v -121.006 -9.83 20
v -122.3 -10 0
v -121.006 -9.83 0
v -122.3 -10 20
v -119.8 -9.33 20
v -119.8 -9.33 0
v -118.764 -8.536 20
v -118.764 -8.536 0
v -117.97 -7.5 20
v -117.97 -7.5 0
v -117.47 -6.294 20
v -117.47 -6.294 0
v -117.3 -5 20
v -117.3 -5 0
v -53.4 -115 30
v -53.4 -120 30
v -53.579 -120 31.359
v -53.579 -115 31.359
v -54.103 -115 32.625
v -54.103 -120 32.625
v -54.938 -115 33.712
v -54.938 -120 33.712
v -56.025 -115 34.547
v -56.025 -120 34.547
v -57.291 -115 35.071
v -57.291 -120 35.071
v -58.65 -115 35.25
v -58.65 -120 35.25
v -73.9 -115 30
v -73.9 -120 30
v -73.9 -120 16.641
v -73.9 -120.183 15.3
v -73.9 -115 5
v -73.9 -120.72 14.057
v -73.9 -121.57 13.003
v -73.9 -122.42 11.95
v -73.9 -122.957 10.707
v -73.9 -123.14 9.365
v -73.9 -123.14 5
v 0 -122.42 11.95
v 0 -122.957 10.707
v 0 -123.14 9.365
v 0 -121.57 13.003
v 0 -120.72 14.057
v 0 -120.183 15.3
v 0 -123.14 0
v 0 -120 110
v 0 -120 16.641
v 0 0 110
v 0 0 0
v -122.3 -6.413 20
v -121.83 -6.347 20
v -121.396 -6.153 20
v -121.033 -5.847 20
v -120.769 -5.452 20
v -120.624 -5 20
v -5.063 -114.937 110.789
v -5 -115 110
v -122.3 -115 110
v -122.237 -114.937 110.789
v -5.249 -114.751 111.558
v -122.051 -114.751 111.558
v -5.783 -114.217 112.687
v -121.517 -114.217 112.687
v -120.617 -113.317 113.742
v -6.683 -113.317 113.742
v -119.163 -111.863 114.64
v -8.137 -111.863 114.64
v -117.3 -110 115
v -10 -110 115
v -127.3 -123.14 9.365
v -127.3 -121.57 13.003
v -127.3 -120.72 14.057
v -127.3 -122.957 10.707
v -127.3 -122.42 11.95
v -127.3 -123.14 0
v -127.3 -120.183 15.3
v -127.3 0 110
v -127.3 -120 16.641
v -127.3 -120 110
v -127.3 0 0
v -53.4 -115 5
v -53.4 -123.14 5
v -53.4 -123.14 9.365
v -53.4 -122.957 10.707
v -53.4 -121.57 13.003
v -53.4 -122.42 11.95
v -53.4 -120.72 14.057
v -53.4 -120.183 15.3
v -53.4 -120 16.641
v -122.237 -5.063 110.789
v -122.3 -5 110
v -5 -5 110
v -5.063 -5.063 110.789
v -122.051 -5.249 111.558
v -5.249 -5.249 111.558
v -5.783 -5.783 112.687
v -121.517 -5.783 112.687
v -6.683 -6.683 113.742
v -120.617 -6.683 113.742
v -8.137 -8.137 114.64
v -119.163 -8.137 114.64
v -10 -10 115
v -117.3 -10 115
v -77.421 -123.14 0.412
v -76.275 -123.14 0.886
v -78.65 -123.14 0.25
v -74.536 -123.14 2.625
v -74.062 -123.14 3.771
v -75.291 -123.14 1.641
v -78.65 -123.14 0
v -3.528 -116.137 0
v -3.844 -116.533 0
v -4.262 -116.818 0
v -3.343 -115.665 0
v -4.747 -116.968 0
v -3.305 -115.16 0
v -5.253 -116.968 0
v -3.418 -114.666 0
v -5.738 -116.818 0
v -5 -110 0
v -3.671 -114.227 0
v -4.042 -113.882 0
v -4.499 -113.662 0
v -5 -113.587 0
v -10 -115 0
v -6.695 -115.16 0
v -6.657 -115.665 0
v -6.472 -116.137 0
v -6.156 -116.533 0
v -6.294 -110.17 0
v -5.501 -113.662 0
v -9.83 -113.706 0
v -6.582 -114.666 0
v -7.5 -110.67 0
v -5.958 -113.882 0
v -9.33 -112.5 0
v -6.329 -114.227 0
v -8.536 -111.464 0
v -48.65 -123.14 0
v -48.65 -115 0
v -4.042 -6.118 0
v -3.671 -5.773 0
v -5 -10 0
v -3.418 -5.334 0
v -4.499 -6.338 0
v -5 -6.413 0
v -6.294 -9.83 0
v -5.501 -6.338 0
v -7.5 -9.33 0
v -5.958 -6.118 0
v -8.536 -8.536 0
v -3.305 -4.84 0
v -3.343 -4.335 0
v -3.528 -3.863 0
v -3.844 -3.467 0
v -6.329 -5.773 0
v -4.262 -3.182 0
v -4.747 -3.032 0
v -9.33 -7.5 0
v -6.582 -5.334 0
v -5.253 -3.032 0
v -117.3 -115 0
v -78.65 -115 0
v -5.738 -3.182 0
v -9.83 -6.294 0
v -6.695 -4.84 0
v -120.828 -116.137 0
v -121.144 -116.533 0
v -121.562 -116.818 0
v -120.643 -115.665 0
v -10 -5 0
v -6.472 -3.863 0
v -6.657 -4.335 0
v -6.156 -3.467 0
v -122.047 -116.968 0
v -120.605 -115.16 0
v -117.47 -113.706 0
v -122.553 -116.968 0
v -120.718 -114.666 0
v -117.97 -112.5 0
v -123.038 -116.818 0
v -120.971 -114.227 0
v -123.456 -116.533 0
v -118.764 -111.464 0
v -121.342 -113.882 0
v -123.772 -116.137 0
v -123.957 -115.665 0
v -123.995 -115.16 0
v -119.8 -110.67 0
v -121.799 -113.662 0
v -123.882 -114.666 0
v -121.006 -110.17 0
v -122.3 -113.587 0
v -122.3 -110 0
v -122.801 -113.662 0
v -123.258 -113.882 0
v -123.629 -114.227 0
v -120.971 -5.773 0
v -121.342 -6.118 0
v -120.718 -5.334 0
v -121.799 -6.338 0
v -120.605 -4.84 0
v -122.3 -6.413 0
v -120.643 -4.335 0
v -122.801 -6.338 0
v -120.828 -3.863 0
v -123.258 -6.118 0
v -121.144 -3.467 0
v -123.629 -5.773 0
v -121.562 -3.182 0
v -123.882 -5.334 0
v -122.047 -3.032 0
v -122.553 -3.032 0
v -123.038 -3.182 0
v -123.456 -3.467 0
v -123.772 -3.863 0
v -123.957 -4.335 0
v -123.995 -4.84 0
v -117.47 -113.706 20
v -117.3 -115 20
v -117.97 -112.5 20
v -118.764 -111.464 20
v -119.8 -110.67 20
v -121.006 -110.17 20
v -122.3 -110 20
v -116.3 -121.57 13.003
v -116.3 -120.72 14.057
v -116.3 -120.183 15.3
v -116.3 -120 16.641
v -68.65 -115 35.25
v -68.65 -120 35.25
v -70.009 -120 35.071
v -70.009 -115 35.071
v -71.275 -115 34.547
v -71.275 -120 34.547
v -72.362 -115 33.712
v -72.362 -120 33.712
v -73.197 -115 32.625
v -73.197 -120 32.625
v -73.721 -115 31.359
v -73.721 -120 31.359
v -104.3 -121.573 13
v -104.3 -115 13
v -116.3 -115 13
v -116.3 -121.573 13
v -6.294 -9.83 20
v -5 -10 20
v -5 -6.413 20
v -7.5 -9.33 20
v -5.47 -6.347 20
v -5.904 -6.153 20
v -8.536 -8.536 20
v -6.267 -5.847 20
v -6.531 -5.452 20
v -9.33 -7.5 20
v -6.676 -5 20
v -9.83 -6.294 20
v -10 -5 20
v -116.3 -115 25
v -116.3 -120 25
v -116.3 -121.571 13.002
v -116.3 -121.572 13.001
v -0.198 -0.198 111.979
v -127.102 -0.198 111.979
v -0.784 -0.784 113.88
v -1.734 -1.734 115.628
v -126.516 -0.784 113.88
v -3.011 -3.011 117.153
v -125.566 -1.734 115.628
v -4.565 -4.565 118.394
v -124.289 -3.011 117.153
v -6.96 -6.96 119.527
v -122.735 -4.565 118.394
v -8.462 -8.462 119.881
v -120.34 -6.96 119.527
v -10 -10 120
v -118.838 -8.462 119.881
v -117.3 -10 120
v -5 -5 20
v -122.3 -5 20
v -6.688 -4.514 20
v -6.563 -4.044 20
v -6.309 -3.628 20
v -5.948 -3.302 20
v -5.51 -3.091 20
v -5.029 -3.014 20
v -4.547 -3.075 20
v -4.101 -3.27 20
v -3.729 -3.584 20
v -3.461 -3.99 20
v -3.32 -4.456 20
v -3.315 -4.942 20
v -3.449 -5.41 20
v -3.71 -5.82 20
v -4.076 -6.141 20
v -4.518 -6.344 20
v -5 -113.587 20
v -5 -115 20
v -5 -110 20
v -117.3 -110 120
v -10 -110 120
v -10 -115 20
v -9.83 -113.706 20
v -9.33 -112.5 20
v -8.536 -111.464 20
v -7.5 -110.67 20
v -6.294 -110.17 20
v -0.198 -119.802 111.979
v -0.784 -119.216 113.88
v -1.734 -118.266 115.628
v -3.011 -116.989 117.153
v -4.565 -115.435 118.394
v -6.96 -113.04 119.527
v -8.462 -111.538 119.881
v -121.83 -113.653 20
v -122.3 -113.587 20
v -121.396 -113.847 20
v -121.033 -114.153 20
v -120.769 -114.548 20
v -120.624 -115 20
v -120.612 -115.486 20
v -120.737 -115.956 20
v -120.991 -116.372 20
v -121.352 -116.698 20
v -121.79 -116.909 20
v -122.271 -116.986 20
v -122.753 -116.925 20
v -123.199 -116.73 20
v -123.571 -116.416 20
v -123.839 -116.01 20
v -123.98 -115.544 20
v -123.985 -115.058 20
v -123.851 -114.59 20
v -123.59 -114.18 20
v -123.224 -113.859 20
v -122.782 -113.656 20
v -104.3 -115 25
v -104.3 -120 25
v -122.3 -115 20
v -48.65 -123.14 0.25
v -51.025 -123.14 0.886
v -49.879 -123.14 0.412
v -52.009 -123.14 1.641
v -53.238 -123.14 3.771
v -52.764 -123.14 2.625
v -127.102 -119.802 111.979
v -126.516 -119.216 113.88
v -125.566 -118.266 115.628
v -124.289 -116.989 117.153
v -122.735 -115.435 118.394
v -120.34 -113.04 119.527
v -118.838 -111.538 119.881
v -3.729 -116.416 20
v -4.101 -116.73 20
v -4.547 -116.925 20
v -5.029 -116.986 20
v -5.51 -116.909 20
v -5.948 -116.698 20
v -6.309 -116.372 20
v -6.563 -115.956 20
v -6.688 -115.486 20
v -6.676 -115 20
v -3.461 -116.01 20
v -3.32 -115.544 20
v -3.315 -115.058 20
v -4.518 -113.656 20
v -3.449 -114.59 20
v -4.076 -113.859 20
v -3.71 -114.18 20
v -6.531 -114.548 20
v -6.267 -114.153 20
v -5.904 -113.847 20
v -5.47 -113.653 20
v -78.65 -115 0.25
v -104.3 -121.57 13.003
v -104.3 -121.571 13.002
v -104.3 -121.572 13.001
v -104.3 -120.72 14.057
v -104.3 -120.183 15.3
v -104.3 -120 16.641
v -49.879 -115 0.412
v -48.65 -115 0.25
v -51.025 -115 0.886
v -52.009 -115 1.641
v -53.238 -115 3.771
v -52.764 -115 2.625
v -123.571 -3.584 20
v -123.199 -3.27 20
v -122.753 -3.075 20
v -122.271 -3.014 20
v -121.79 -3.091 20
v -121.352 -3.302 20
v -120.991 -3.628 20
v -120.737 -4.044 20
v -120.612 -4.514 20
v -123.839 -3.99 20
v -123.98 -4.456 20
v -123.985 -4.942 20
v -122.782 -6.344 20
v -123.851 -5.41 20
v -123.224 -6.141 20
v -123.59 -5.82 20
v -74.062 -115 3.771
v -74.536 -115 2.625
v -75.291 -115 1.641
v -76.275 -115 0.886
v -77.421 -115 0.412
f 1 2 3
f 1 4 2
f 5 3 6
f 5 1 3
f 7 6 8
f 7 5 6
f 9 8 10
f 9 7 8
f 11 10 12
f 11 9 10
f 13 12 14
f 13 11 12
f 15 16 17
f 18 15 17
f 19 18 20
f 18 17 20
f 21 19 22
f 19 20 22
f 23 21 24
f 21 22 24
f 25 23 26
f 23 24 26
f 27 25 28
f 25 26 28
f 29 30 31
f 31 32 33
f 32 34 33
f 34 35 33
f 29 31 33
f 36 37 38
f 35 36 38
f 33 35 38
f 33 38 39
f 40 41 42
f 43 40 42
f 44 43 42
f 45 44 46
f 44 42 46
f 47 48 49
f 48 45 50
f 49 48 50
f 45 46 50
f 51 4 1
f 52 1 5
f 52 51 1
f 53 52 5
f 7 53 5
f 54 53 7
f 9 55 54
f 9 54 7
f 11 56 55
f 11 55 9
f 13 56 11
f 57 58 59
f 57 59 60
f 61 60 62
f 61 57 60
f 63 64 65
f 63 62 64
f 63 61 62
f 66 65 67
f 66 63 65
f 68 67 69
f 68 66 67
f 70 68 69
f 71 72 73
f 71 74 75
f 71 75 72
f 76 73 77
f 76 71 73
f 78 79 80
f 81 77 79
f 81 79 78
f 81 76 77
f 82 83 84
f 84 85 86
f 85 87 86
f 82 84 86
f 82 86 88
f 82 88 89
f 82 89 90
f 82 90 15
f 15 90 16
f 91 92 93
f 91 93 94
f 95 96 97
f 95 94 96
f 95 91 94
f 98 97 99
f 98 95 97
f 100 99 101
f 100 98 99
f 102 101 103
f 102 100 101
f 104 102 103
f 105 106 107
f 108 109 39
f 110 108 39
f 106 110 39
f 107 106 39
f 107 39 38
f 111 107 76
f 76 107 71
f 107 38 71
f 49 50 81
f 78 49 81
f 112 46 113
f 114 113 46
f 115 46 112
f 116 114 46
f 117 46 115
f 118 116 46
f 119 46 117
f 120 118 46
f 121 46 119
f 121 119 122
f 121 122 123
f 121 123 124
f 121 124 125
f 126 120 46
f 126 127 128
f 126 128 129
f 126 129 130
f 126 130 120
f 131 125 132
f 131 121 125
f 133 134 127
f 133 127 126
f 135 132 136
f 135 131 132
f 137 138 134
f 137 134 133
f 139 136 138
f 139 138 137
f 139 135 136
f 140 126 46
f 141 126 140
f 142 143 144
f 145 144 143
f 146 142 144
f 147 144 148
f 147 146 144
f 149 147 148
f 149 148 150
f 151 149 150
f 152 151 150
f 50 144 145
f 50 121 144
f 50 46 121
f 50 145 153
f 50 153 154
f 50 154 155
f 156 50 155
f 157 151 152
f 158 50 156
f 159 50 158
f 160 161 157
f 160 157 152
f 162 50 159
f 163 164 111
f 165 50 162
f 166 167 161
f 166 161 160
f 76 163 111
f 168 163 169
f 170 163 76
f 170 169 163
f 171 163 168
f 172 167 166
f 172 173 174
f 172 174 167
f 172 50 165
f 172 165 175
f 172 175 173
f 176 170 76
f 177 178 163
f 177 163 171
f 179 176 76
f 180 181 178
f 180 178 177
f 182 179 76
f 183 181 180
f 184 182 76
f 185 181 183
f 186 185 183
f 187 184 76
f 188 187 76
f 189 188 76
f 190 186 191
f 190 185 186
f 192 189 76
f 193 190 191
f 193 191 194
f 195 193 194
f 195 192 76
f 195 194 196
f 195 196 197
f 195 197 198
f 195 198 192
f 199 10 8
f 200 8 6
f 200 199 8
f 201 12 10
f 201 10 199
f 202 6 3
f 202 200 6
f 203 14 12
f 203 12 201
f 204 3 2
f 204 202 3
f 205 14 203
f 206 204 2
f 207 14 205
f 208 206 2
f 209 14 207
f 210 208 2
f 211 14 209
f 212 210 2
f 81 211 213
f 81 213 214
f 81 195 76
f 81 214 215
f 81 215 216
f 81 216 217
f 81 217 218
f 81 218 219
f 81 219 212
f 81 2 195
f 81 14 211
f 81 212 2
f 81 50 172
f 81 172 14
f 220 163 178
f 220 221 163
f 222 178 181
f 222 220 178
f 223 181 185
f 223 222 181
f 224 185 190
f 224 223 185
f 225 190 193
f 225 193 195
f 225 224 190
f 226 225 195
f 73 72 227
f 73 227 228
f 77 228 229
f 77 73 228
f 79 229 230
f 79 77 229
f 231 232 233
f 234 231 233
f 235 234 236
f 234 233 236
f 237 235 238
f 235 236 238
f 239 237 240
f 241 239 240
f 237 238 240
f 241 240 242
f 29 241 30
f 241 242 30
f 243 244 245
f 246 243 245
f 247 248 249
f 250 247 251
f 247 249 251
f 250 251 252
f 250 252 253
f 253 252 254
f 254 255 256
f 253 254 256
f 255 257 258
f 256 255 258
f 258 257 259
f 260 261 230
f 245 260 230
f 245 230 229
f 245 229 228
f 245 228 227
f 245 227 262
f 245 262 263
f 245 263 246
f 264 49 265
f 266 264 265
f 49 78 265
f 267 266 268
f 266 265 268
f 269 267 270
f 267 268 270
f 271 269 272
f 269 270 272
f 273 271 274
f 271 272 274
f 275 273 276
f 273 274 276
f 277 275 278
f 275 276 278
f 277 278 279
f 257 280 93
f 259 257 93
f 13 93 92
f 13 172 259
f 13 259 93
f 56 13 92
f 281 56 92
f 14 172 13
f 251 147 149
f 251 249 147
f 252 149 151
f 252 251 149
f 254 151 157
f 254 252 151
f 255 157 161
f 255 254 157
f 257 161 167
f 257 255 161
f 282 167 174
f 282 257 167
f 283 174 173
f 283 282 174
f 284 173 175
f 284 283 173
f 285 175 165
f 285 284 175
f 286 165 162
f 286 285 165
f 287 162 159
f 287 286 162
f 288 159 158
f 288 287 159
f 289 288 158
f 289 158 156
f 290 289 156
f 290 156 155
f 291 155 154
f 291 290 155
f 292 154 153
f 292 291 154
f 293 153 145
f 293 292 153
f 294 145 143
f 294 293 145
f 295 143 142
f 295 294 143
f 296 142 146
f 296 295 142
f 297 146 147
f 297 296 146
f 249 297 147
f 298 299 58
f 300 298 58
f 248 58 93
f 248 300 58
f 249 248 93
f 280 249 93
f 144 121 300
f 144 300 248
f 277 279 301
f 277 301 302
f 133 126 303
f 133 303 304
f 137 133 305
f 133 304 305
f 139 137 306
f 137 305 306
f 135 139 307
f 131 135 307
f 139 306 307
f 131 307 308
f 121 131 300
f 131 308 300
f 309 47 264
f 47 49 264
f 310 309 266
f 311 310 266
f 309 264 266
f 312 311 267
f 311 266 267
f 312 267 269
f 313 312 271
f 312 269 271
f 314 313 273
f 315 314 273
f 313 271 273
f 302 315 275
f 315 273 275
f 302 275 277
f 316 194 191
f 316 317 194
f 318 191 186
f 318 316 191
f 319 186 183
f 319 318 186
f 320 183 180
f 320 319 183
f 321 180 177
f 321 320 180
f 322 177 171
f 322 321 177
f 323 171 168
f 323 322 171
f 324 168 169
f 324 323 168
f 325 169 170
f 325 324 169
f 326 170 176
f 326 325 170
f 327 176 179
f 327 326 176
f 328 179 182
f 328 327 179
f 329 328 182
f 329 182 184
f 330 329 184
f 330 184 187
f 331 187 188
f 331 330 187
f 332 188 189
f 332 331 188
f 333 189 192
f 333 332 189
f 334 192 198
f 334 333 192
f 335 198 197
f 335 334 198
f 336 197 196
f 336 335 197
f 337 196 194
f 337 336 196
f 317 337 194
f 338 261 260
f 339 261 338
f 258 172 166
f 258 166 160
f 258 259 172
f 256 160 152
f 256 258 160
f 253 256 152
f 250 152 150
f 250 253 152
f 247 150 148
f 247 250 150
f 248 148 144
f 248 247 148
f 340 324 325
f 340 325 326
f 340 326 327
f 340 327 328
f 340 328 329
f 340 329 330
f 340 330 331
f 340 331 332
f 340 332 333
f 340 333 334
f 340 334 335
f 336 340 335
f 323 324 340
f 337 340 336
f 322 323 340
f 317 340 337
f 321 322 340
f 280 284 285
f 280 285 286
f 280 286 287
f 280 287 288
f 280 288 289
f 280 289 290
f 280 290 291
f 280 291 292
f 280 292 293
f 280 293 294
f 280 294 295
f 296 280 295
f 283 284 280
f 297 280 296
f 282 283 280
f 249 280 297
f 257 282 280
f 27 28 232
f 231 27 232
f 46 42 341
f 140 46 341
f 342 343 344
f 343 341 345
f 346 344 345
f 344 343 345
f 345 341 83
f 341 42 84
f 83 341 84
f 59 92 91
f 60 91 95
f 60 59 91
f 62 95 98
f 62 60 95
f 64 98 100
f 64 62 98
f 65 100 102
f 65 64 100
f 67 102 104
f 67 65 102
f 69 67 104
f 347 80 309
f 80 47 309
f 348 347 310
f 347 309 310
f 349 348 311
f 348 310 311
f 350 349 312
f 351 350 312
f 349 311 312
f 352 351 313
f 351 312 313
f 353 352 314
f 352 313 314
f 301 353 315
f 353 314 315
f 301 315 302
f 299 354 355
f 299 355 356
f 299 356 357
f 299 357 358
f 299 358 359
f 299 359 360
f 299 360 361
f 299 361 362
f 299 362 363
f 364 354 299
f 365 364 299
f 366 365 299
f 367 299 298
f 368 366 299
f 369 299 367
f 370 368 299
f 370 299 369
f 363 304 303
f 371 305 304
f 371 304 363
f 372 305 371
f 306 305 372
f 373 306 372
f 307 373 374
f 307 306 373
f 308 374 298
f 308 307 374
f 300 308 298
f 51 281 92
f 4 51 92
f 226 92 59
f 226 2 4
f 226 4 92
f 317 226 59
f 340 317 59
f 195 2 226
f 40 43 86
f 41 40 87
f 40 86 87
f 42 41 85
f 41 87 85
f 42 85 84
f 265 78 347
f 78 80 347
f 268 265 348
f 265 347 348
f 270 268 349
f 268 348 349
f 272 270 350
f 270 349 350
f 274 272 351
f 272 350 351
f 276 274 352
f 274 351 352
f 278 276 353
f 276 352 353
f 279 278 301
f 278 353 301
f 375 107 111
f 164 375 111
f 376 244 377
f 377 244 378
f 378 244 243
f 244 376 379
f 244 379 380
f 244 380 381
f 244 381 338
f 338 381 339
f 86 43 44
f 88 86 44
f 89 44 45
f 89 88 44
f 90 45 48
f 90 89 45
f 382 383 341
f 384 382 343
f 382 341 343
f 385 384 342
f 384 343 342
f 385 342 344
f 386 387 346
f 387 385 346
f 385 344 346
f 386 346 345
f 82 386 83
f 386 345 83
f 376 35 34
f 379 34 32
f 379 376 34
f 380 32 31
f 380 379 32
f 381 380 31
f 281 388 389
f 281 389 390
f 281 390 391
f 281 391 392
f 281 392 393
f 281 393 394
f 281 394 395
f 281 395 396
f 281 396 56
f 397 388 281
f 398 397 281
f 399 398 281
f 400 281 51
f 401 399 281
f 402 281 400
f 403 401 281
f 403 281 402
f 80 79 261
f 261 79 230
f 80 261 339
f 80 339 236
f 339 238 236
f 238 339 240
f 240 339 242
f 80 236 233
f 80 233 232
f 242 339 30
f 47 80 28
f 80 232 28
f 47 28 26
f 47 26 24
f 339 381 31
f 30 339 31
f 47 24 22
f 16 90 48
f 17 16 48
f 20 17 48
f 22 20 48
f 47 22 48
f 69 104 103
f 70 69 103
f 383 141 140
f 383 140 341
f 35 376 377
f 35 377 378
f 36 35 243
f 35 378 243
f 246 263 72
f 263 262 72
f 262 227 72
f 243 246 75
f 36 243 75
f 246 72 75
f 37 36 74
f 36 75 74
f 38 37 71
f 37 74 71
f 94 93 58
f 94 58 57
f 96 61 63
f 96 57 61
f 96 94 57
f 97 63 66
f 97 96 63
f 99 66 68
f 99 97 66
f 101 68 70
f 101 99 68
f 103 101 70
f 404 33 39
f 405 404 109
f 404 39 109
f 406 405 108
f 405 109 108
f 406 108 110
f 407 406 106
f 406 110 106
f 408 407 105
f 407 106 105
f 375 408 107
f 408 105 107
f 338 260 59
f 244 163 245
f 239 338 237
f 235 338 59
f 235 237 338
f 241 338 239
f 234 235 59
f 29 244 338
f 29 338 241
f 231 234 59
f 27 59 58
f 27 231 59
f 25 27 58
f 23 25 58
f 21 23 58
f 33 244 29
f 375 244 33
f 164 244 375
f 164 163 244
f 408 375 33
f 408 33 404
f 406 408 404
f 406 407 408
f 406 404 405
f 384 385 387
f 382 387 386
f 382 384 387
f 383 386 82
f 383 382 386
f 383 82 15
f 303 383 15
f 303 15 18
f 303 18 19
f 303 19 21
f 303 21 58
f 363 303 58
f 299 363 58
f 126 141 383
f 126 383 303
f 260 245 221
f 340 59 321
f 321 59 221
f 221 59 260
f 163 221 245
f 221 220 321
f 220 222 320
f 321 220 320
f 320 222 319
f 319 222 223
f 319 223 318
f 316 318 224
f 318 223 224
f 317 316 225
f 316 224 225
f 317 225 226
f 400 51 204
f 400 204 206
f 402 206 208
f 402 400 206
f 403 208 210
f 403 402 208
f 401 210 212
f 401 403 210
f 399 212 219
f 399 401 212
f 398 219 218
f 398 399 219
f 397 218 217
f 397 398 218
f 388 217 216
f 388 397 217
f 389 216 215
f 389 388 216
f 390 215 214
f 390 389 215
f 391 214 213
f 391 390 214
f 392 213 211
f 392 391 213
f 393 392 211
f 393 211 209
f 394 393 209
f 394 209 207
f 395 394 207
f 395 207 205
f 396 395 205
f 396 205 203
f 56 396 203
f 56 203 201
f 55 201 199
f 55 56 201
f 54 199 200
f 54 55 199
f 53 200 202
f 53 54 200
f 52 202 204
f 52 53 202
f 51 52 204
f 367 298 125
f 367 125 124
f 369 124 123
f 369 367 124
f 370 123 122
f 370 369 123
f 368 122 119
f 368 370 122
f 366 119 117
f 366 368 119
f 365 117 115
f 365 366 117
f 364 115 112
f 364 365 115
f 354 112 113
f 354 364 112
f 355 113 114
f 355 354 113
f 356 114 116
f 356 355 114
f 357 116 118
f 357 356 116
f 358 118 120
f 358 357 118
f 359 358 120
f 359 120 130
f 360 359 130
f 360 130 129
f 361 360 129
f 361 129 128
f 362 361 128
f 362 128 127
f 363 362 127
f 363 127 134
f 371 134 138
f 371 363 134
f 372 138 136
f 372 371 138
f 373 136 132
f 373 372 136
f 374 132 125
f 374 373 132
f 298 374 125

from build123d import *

# Parameters (mm, degrees)
BOSS_EXTRUDE1_DEPTH     = 120
FILLET1_R               = 10
SHELL3_T                = -5
SKETCH3_R               = 1.7000000000000046
SKETCH3_R_2             = 1.6999999999999973
SKETCH3_R_3             = 1.6999999999999988
SKETCH3_R_4             = 1.7000000000000004
BOSS_EXTRUDE3_DEPTH     = 20
CUT_EXTRUDE1_DEPTH      = 213.14450263912096
CUT_EXTRUDE1_DEPTH_BACK = 20
SKETCH2_R               = 1.6999999999999973
SKETCH2_R_2             = 1.7000000000000024
SKETCH2_R_3             = 1.6999999999999988
SKETCH2_R_4             = 1.7000000000000004
FILLET5_R               = 5
SKETCH4_W               = 11.999999999999972
SKETCH4_H               = 11.999999999999998
CUT_EXTRUDE2_DEPTH      = 11.000000000000004
BOSS_EXTRUDE4_DEPTH     = 3.14
FILLET6_R               = 5
FILLET7_R               = 5
CUT_EXTRUDE3_DEPTH      = 13.140000000000002


# Some blends are built 0.0001 mm under size
with BuildPart() as part:
    # Sketch1 → Boss-Extrude1 (new body)
    with BuildSketch(Plane.XY):
        Polygon((0, 0), (-127.3, 0), (-127.29999999999997, -120.00000000000001), (0, -120.00000000000001), align=None)
    extrude(amount=BOSS_EXTRUDE1_DEPTH)

    # Fillet1
    fillet1_edges = [part.edges().sort_by_distance(p)[0] for p in [
        (-127.29999999999998, -60.00000000000001, 120),
        (-63.649999999999984, -120.00000000000001, 120),
        (0, -60.00000000000001, 120),
        (-63.65, 0, 120),
    ]]
    fillet(fillet1_edges, radius=FILLET1_R)

    # Shell3
    shell3_openings = [part.faces().sort_by_distance(p)[0] for p in [
        (-63.65, -60, 0),
    ]]
    offset(amount=SHELL3_T, openings=shell3_openings)

    # Sketch3 → Boss-Extrude3 (add)
    # profile 1 of 4: a face of its own
    with BuildSketch(Plane(origin=(0, 0, 0), x_dir=(-1, 0, 0), z_dir=(0, 0, -1))):
        Polygon((10.00000000000002, -110.00000000000004), (10.000000000000023, -120.00000000000006), (0, -120.00000000000003), (3.816e-14, -110.00000000000006), align=None)
        with Locations((5, -115.28672427337001)):
            Circle(SKETCH3_R, mode=Mode.SUBTRACT)
    # profile 2 of 4: a face of its own
    with BuildSketch(Plane(origin=(0, 0, 0), x_dir=(-1, 0, 0), z_dir=(0, 0, -1))):
        Polygon((117.30000000000004, -109.99999999999997), (117.30000000000007, -119.99999999999997), (127.29999999999997, -120.00000000000001), (127.30000000000005, -109.99999999999996), align=None)
        with Locations((122.3, -115.28672427337001)):
            Circle(SKETCH3_R_2, mode=Mode.SUBTRACT)
    # profile 3 of 4: a face of its own
    with BuildSketch(Plane(origin=(0, 0, 0), x_dir=(-1, 0, 0), z_dir=(0, 0, -1))):
        Polygon((127.3, -10.000000000000007), (117.30000000000001, -10.000000000000007), (117.30000000000001, -1.241e-14), (127.3, 0), align=None)
        with Locations((122.3, -4.713275726630009)):
            Circle(SKETCH3_R_3, mode=Mode.SUBTRACT)
    # profile 4 of 4: a face of its own
    with BuildSketch(Plane(origin=(0, 0, 0), x_dir=(-1, 0, 0), z_dir=(0, 0, -1))):
        Polygon((9.99999999999998, -10), (9.999999999999977, 0), (0, 0), (0, -10), align=None)
        with Locations((4.999999999999997, -4.713275726630009)):
            Circle(SKETCH3_R_4, mode=Mode.SUBTRACT)
    extrude(amount=-BOSS_EXTRUDE3_DEPTH)

    # Sketch2 → Cut-Extrude1 (cut, two sides: drawn at the far end of the back side and taken through both)
    with BuildSketch(Plane(origin=(0, 0, 0), x_dir=(-1, 0, 0), z_dir=(0, 0, -1)).offset(-CUT_EXTRUDE1_DEPTH_BACK)):
        with Locations(Location((122.3, -115.28672427337001, 0), (0, 0, 90))):
            Circle(SKETCH2_R)
        with Locations(Location((5, -115.28672427337001, 0), (0, 0, 90))):
            Circle(SKETCH2_R_2)
        with Locations(Location((122.3, -4.713275726630009, 0), (0, 0, 270))):
            Circle(SKETCH2_R_3)
        with Locations(Location((4.999999999999997, -4.713275726630009, 0), (0, 0, 270))):
            Circle(SKETCH2_R_4)
    extrude(amount=CUT_EXTRUDE1_DEPTH + CUT_EXTRUDE1_DEPTH_BACK, mode=Mode.SUBTRACT)

    # Fillet5
    fillet5_edges = [part.edges().sort_by_distance(p)[0] for p in [
        (-117.30000000000004, -109.99999999999997, 10),
        (-10.00000000000002, -110.00000000000004, 10),
        (-117.30000000000001, -10.000000000000007, 10),
        (-9.99999999999998, -10, 10),
    ]]
    fillet(fillet5_edges, radius=FILLET5_R - 0.0001)  # a hair under: the kernel refuses the full size

    # Sketch4 → Cut-Extrude2 (cut)
    with BuildSketch(Plane.XZ.offset(120.00000000000001)):
        with Locations((-110.29999999999995, 19.000000000000004)):
            Rectangle(SKETCH4_W, SKETCH4_H)
    extrude(amount=-CUT_EXTRUDE2_DEPTH, mode=Mode.SUBTRACT)

    # Sketch5 → Boss-Extrude4 (add)
    with BuildSketch(Plane.XZ.offset(120.00000000000001)):
        Polygon((-127.29999999999997, 0), (-127.29999999999997, 12), (0, 11.999999999999996), (0, 0), align=None)
    extrude(amount=BOSS_EXTRUDE4_DEPTH)

    # Fillet6
    # the kernel refuses this fillet: 5 mm, written as the material it adds along each edge
    with BuildSketch(Plane(origin=(-127.29999999999997, -120.00000000000001, 12), x_dir=(0, -1, 0), z_dir=(1, 0, -3e-17))) as fillet6_piece_1_section:
        with BuildLine():
            CenterArc((5, -4.6411636471902185), FILLET6_R, 111.83901544841774, 68.16098455158226)
            Line((0, -4.6411636471902185), (-0.09999999999999432, -4.6411636471902185))
            Line((-0.09999999999999432, -4.6411636471902185), (-0.09999999999999432, 0))
            Line((-0.09999999999999432, 0), (0, 0.09999999999999964))
            ThreePointArc((0, 0.09999999999999964), (1.5700000000000074, 0.09999999999999964), (3.102800000000002, 0.09282327294380366))
            Line((3.102800000000002, 0.09282327294380366), (3.1400000000000006, 0))
        make_face()
    fillet6_piece_1 = extrude(amount=127.29999999999997, mode=Mode.PRIVATE)
    fillet6_piece_1 = split(fillet6_piece_1, bisect_by=Plane(origin=(-116.29999999999995, -121.1633004902019, 12.387505999299782), z_dir=(-1, 0, 0)), keep=Keep.TOP, mode=Mode.PRIVATE)
    fillet6_piece_1 = split(fillet6_piece_1, bisect_by=Plane(origin=(-121.79999999999993, -121.1633004902019, 13.000000000000005), z_dir=(0, 0, -1)), keep=Keep.TOP, mode=Mode.PRIVATE)
    add(fillet6_piece_1)
    with BuildSketch(Plane(origin=(-127.29999999999997, -120.00000000000001, 12), x_dir=(0, -1, 0), z_dir=(1, 0, -3e-17))) as fillet6_piece_2_section:
        with BuildLine():
            CenterArc((5, -4.6411636471902185), FILLET6_R, 111.83901544841774, 68.16098455158226)
            Line((0, -4.6411636471902185), (-0.09999999999999432, -4.6411636471902185))
            Line((-0.09999999999999432, -4.6411636471902185), (-0.09999999999999432, 0))
            Line((-0.09999999999999432, 0), (0, 0.09999999999999964))
            ThreePointArc((0, 0.09999999999999964), (1.5700000000000074, 0.09999999999999964), (3.102800000000002, 0.09282327294380366))
            Line((3.102800000000002, 0.09282327294380366), (3.1400000000000006, 0))
        make_face()
    fillet6_piece_2 = extrude(amount=127.29999999999997, mode=Mode.PRIVATE)
    fillet6_piece_2 = split(fillet6_piece_2, bisect_by=Plane(origin=(-116.29999999999995, -120.36954878500708, 14.03973885667022), z_dir=(-1, 0, 0)), keep=Keep.TOP, mode=Mode.PRIVATE)
    fillet6_piece_2 = split(fillet6_piece_2, bisect_by=Plane(origin=(-121.79999999999998, -120.36954878500708, 13.000000000000005), z_dir=(0, 0, 1)), keep=Keep.TOP, mode=Mode.PRIVATE)
    add(fillet6_piece_2)
    with BuildSketch(Plane(origin=(-127.29999999999997, -120.00000000000001, 12), x_dir=(0, -1, 0), z_dir=(1, 0, -3e-17))) as fillet6_piece_3_section:
        with BuildLine():
            CenterArc((5, -4.6411636471902185), FILLET6_R, 111.83901544841774, 68.16098455158226)
            Line((0, -4.6411636471902185), (-0.09999999999999432, -4.6411636471902185))
            Line((-0.09999999999999432, -4.6411636471902185), (-0.09999999999999432, 0))
            Line((-0.09999999999999432, 0), (0, 0.09999999999999964))
            ThreePointArc((0, 0.09999999999999964), (1.5700000000000074, 0.09999999999999964), (3.102800000000002, 0.09282327294380366))
            Line((3.102800000000002, 0.09282327294380366), (3.1400000000000006, 0))
        make_face()
    fillet6_piece_3 = extrude(amount=127.29999999999997, mode=Mode.PRIVATE)
    fillet6_piece_3 = split(fillet6_piece_3, bisect_by=Plane(origin=(-116.29999999999995, -121.16330049020192, 12.387505999299782), z_dir=(1, 0, 0)), keep=Keep.TOP, mode=Mode.PRIVATE)
    fillet6_piece_3 = split(fillet6_piece_3, bisect_by=Plane(origin=(-110.29999999999997, -121.16330049020192, 13.000000000000005), z_dir=(0, 0, -1)), keep=Keep.TOP, mode=Mode.PRIVATE)
    fillet6_piece_3 = split(fillet6_piece_3, bisect_by=Plane(origin=(-104.29999999999997, -121.16330049020192, 12.387505999299782), z_dir=(-1, 0, 0)), keep=Keep.TOP, mode=Mode.PRIVATE)
    add(fillet6_piece_3)
    with BuildSketch(Plane(origin=(-127.29999999999997, -120.00000000000001, 12), x_dir=(0, -1, 0), z_dir=(1, 0, -3e-17))) as fillet6_piece_4_section:
        with BuildLine():
            CenterArc((5, -4.6411636471902185), FILLET6_R, 111.83901544841774, 68.16098455158226)
            Line((0, -4.6411636471902185), (-0.09999999999999432, -4.6411636471902185))
            Line((-0.09999999999999432, -4.6411636471902185), (-0.09999999999999432, 0))
            Line((-0.09999999999999432, 0), (0, 0.09999999999999964))
            ThreePointArc((0, 0.09999999999999964), (1.5700000000000074, 0.09999999999999964), (3.102800000000002, 0.09282327294380366))
            Line((3.102800000000002, 0.09282327294380366), (3.1400000000000006, 0))
        make_face()
    fillet6_piece_4 = extrude(amount=127.29999999999997, mode=Mode.PRIVATE)
    fillet6_piece_4 = split(fillet6_piece_4, bisect_by=Plane(origin=(-52.149999999999835, -121.16330049020192, 13.000000000000005), z_dir=(0, 0, -1)), keep=Keep.TOP, mode=Mode.PRIVATE)
    fillet6_piece_4 = split(fillet6_piece_4, bisect_by=Plane(origin=(-104.29999999999997, -121.16330049020192, 12.387505999299783), z_dir=(1, 0, 0)), keep=Keep.TOP, mode=Mode.PRIVATE)
    add(fillet6_piece_4)
    with BuildSketch(Plane(origin=(-127.29999999999997, -120.00000000000001, 12), x_dir=(0, -1, 0), z_dir=(1, 0, -3e-17))) as fillet6_piece_5_section:
        with BuildLine():
            CenterArc((5, -4.6411636471902185), FILLET6_R, 111.83901544841774, 68.16098455158226)
            Line((0, -4.6411636471902185), (-0.09999999999999432, -4.6411636471902185))
            Line((-0.09999999999999432, -4.6411636471902185), (-0.09999999999999432, 0))
            Line((-0.09999999999999432, 0), (0, 0.09999999999999964))
            ThreePointArc((0, 0.09999999999999964), (1.5700000000000074, 0.09999999999999964), (3.102800000000002, 0.09282327294380366))
            Line((3.102800000000002, 0.09282327294380366), (3.1400000000000006, 0))
        make_face()
    fillet6_piece_5 = extrude(amount=127.29999999999997, mode=Mode.PRIVATE)
    fillet6_piece_5 = split(fillet6_piece_5, bisect_by=Plane(origin=(-52.14999999999998, -120.36954878500707, 13.000000000000005), z_dir=(0, 0, 1)), keep=Keep.TOP, mode=Mode.PRIVATE)
    fillet6_piece_5 = split(fillet6_piece_5, bisect_by=Plane(origin=(-104.29999999999997, -120.36954878500707, 14.03973885667022), z_dir=(1, 0, 0)), keep=Keep.TOP, mode=Mode.PRIVATE)
    add(fillet6_piece_5)

    # Fillet7
    # the kernel refuses this fillet: 5 mm, written as the material it takes off along each edge
    with BuildSketch(Plane(origin=(-133.88712936466723, -123.14000000000001, 11.999999999999773), x_dir=(0, 0.8426718111972903, 0.5384275425844023), z_dir=(1, 0, -1e-17))) as fillet7_piece_1:
        with BuildLine():
            CenterArc((2.794682305385189, -4.912453005847793), FILLET7_R, 100.73764343311844, 46.68569768534586)
            Line((-1.4186767506012903, -2.2203152929258243), (0, 0))
            ThreePointArc((0, 0), (0.93156076846174, -0.08754699415221018), (1.8631215369234693, -9e-17))
        make_face()
    extrude(amount=140.47425872933445, mode=Mode.SUBTRACT)

    # Sketch6 → Cut-Extrude3 (cut)
    with BuildSketch(Plane.XZ.offset(123.14000000000001)):
        with BuildLine():
            Line((-78.64999999999999, -2.6e-15), (-73.64999999999999, -2.17e-15))
            Line((-73.64999999999999, -2.01e-15), (-53.65, 0))
            Line((-53.65, -4.3e-16), (-48.65, 0))
            ThreePointArc((-48.65, 8.9e-16), (-52.185533905932736, 1.4644660940672627), (-53.65, 5))
            Line((-53.65, 5), (-53.65, 9.365148254133372))
            Line((-53.65, 9.365148254133372), (-73.64999999999999, 9.365148254133372))
            Line((-73.64999999999999, 9.365148254133372), (-73.64999999999999, 4.999999999999997))
            ThreePointArc((-73.64999999999999, 4.999999999999997), (-75.11446609406725, 1.4644660940672605), (-78.64999999999999, -1.78e-15))
        make_face()
        with BuildLine():
            Line((-73.64999999999999, 30.000000000000004), (-73.64999999999999, 9.365148254133372))
            Line((-73.64999999999999, 9.365148254133372), (-53.65, 9.365148254133372))
            Line((-53.65, 9.365148254133372), (-53.65, 30.000000000000007))
            ThreePointArc((-53.65, 30.000000000000004), (-55.114466094067254, 33.53553390593274), (-58.64999999999999, 35))
            Line((-58.64999999999999, 35), (-68.64999999999999, 35))
            ThreePointArc((-68.64999999999999, 35), (-72.18553390593273, 33.53553390593274), (-73.64999999999999, 30.000000000000004))
        make_face()
        with BuildLine():
            Line((-73.89999999999999, 9.365148254133372), (-73.64999999999999, 9.365148254133372))
            Line((-73.64999999999999, 9.365148254133372), (-73.64999999999999, 30.000000000000004))
            ThreePointArc((-73.64999999999999, 30.000000000000004), (-72.18553390593273, 33.53553390593274), (-68.64999999999999, 35))
            Line((-68.64999999999999, 35), (-58.64999999999999, 35))
            ThreePointArc((-58.64999999999999, 35), (-55.114466094067254, 33.53553390593274), (-53.65, 30.000000000000004))
            Line((-53.65, 30.000000000000007), (-53.65, 9.365148254133372))
            Line((-53.65, 9.365148254133372), (-53.4, 9.365148254133372))
            Line((-53.4, 9.365148254133372), (-53.4, 30.000000000000004))
            ThreePointArc((-53.4, 30.000000000000004), (-54.93768939877062, 33.712310601229376), (-58.64999999999999, 35.25))
            Line((-58.64999999999999, 35.25), (-68.64999999999999, 35.25))
            ThreePointArc((-68.64999999999999, 35.25), (-72.36231060122937, 33.712310601229376), (-73.89999999999999, 30.000000000000004))
            Line((-73.89999999999999, 30.000000000000004), (-73.89999999999999, 9.365148254133372))
        make_face()
        with BuildLine():
            ThreePointArc((-53.65, 5), (-52.185533905932736, 1.4644660940672627), (-48.65, 8.9e-16))
            Line((-48.65, 0), (-48.65, 0.25000000000000455))
            ThreePointArc((-48.65, 0.2500000000000062), (-52.0087572106361, 1.6412427893639014), (-53.4, 5.000000000000001))
            Line((-53.4, 5.000000000000001), (-53.4, 9.365148254133372))
            Line((-53.4, 9.365148254133372), (-53.65, 9.365148254133372))
            Line((-53.65, 9.365148254133372), (-53.65, 5))
        make_face()
        with BuildLine():
            Line((-78.64999999999999, 0.249999999999995), (-78.64999999999999, -2.61e-15))
            ThreePointArc((-78.64999999999999, -1.78e-15), (-75.11446609406725, 1.4644660940672605), (-73.64999999999999, 4.999999999999997))
            Line((-73.64999999999999, 4.999999999999997), (-73.64999999999999, 9.365148254133372))
            Line((-73.64999999999999, 9.365148254133372), (-73.89999999999999, 9.365148254133372))
            Line((-73.89999999999999, 9.365148254133372), (-73.89999999999999, 4.999999999999997))
            ThreePointArc((-73.89999999999999, 4.999999999999997), (-75.29124278936389, 1.641242789363897), (-78.64999999999999, 0.24999999999999112))
        make_face()
    extrude(amount=-CUT_EXTRUDE3_DEPTH, mode=Mode.SUBTRACT)


solid = part.part
